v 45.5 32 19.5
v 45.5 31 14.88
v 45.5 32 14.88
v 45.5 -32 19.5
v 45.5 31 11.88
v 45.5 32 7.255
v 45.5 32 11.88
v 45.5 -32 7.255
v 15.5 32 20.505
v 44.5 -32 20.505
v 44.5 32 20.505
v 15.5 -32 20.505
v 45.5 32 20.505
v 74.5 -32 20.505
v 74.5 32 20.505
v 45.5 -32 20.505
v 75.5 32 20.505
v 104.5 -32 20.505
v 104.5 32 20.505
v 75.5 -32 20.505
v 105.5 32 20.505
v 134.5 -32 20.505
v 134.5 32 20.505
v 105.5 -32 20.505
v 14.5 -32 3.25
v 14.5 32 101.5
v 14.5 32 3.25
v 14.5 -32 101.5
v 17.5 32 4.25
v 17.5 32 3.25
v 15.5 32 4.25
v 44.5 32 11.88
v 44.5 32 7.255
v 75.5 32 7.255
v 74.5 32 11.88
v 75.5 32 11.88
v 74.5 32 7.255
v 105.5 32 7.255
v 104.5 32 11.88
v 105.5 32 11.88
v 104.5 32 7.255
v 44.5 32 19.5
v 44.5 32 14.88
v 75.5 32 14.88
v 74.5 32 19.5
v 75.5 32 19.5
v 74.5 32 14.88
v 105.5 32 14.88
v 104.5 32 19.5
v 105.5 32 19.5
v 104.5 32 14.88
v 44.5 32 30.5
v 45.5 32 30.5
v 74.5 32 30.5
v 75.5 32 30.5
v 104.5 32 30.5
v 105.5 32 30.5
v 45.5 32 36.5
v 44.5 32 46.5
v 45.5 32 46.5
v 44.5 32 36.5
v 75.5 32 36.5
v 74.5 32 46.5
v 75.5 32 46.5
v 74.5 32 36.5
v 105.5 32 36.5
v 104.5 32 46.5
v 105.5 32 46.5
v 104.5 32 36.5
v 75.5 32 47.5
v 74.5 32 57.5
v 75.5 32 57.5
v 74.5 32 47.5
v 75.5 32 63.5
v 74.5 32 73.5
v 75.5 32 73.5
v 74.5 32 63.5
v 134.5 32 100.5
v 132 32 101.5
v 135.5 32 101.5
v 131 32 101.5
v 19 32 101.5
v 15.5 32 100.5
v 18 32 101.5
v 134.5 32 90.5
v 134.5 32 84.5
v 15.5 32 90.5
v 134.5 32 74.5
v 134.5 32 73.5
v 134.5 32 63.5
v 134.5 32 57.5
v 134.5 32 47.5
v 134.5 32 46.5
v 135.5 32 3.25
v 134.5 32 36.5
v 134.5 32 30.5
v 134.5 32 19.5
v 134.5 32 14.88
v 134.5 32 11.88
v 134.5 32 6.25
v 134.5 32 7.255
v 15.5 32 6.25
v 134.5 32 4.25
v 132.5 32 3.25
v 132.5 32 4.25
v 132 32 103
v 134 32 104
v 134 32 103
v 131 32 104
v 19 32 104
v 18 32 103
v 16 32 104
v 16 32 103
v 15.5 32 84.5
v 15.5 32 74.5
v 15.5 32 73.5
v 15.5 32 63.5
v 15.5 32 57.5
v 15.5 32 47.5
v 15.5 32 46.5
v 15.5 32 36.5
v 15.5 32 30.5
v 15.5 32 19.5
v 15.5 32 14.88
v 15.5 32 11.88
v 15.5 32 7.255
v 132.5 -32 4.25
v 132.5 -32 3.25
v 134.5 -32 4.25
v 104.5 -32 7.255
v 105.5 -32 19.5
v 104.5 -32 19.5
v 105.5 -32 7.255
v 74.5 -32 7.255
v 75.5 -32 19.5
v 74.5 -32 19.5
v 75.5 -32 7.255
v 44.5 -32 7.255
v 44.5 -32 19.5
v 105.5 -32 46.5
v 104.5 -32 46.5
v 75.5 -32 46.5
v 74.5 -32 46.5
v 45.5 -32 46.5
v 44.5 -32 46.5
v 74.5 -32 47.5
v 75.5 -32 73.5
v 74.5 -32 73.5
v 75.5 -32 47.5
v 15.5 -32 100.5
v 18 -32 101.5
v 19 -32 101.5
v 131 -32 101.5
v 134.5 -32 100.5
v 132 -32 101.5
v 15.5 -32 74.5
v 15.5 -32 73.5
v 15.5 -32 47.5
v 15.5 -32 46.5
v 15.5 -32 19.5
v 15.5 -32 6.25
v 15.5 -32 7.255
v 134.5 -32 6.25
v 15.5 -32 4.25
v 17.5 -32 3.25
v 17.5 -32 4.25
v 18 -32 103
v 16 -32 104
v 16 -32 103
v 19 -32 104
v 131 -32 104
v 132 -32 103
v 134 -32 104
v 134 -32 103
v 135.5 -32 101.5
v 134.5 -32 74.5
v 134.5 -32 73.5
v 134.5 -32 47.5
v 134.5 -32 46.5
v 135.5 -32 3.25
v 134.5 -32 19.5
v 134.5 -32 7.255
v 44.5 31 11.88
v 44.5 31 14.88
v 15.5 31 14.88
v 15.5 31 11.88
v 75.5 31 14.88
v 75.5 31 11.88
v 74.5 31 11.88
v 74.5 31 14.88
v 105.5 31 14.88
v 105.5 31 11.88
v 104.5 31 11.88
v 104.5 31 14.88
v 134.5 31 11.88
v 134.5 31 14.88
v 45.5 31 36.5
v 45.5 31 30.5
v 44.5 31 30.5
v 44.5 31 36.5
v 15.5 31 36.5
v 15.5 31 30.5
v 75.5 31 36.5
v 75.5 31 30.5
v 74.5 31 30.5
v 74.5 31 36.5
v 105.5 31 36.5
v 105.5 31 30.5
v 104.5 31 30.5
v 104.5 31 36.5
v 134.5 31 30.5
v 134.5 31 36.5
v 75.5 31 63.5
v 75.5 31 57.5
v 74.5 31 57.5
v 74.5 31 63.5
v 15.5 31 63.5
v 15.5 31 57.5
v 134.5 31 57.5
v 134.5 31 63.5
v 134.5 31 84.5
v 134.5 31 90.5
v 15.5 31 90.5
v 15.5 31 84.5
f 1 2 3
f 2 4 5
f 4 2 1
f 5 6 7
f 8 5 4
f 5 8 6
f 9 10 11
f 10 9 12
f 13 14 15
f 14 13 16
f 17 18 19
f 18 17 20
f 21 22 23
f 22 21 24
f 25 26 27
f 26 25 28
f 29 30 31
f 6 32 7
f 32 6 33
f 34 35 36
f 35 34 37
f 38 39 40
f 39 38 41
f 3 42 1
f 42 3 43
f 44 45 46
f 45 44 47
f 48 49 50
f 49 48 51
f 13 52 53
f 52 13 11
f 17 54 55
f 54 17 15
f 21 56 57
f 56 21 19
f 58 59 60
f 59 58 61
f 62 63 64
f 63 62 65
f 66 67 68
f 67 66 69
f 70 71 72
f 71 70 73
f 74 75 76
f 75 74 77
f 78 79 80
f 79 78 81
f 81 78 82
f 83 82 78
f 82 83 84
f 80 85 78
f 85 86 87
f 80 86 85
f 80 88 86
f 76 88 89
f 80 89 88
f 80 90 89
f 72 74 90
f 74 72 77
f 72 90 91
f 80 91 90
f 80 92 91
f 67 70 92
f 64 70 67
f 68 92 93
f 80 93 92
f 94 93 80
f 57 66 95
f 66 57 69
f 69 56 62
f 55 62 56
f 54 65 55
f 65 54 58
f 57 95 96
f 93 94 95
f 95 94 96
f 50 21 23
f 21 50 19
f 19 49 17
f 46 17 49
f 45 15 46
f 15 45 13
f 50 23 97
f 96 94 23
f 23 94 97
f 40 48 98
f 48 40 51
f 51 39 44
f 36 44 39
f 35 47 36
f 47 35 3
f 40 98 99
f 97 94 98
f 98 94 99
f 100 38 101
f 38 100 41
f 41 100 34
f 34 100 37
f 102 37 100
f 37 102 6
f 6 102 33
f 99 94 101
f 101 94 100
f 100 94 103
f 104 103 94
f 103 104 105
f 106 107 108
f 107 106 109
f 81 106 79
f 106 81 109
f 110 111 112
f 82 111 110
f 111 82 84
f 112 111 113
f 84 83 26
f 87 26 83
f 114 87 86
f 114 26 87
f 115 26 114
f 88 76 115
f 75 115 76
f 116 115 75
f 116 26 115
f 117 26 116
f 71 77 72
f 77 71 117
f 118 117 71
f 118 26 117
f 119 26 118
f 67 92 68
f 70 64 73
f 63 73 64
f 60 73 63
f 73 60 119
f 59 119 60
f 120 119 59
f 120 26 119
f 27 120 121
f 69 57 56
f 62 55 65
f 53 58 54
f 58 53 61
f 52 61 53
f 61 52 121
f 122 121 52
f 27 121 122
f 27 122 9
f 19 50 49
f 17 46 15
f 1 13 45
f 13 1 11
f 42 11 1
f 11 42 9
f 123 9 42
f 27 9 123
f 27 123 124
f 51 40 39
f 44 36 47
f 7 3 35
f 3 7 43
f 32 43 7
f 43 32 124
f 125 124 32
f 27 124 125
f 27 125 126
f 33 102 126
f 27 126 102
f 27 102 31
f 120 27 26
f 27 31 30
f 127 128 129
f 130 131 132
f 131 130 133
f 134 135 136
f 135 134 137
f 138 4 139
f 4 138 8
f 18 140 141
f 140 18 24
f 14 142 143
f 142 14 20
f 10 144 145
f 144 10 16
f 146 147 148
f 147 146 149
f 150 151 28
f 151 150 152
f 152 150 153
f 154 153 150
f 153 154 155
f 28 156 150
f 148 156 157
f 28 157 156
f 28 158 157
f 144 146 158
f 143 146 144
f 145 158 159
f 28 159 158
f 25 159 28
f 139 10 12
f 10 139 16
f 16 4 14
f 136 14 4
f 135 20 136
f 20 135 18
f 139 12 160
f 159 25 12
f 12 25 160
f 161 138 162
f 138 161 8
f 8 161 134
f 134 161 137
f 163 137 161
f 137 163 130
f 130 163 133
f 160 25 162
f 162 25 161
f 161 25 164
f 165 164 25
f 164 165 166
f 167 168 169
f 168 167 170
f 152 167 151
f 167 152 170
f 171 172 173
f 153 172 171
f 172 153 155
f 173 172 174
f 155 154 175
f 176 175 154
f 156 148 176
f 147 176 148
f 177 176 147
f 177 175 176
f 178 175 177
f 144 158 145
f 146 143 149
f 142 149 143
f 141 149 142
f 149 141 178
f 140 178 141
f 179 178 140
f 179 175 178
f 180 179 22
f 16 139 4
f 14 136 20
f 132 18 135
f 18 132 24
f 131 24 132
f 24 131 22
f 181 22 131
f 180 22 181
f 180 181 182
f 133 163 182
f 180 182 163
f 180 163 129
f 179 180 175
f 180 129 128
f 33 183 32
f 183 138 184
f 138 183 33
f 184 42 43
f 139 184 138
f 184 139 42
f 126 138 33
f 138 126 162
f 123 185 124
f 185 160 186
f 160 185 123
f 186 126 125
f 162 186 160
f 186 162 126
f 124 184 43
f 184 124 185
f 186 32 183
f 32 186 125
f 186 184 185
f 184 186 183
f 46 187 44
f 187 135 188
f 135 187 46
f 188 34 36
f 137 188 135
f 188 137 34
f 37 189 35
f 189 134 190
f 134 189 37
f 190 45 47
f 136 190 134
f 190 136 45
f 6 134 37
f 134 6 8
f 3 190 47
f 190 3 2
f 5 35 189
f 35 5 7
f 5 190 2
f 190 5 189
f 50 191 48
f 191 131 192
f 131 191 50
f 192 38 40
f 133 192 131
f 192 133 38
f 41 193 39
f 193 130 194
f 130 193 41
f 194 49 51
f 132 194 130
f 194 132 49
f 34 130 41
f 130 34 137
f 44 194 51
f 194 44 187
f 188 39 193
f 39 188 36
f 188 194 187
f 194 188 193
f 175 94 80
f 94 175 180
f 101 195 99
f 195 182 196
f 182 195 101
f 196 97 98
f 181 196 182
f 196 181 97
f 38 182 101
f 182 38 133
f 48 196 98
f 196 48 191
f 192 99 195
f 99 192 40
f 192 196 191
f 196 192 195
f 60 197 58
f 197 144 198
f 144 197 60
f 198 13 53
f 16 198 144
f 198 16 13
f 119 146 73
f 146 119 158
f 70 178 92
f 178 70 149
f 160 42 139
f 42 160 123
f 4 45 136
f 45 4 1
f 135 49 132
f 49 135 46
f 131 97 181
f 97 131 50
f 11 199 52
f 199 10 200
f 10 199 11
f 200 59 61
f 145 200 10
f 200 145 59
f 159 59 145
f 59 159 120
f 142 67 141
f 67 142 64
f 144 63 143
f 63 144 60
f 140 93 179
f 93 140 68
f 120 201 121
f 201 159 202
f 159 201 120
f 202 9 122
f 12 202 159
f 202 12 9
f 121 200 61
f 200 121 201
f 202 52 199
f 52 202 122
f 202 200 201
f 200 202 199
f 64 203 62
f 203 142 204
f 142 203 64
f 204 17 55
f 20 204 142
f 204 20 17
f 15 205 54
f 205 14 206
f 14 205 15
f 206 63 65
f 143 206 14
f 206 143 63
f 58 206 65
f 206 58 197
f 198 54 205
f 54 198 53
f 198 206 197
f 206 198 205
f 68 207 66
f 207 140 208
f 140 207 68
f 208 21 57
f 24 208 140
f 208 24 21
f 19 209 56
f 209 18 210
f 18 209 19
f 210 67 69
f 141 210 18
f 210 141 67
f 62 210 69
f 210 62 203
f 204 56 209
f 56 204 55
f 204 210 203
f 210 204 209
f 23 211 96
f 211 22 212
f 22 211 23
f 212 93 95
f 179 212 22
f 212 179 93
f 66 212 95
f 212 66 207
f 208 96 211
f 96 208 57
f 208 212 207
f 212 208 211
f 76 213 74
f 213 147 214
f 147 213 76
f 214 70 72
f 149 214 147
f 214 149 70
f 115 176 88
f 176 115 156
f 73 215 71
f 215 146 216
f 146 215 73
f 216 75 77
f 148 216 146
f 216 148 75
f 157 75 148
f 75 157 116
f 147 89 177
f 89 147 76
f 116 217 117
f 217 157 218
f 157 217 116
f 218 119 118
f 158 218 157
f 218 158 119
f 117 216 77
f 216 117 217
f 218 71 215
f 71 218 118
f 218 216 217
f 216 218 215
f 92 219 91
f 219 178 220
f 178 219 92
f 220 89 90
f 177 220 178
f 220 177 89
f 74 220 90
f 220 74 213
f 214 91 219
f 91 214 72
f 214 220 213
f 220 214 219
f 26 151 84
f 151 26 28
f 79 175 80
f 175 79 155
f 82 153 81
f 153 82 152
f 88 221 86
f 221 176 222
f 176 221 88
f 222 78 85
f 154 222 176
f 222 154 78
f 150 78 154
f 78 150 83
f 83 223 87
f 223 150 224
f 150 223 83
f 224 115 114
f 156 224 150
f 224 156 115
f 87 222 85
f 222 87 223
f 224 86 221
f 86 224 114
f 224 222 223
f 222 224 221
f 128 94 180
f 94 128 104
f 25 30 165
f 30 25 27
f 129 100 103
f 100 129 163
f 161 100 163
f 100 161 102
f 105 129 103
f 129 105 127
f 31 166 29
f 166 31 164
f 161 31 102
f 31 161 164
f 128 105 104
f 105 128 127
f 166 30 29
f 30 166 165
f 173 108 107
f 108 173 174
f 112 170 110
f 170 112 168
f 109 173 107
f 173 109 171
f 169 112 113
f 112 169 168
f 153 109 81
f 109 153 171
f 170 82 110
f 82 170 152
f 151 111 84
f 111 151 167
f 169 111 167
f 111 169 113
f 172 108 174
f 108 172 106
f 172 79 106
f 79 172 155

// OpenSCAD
// Half height row(s)
half_row = 1; // 0:25

// Standard height/width row(s)
normal_row = 1; // 0:25

//Double width row(s)
double_row = 1; // 0:25

//Quad width row(s)
quad_row = 1; // 0:25

//Height (mm)
height = 64;

//Top Mounting Clips
topclip = 1; // 0:1

//Bottom Mounting Clips
btmclip = 1; // 0:1

//Left Mounting Clips
//lftclip = 1; // 0:1

//Right Mounting Clips
//rgtclip = 1; // 0:1



grid();


module grid (){

	if (half_row > 0) {
		for (row = [1:half_row]) {
			for (col = [1 : 4]) {
				translate(v = [col*30, 0, row*13.38]) {
						half_box();
				}
			}
		}
	}

	if (normal_row > 0) {
		for (row = [1:normal_row]) {
			for (col = [1 : 4]) {
				translate(v = [col*30, 0, row*27+(half_row*13.5-7)]) {
						box();
				}
			}
		}
	}

	if (double_row > 0) {
		for (row = [1:double_row]) {
			for (col = [1 : 2]) {
				translate(v = [col*60-15 , 0, row*27+(half_row*13.5-7)+(normal_row*27)]) {
						double_box();
				}
			}
		}
	}

	if (quad_row > 0) {
		for (row = [1:quad_row]) {
			translate(v = [75 , 0, row*27+(half_row*13.5-7)+(normal_row*27)+(double_row*27)]) {
					quad_box();
			}
		}
	}
	if (topclip > 0) {
		translate(v = [14.5,-height/2,3.25]) {
			difference() {
				cube(size = [121,height,4]);
				translate( v = [1,0,1]) {
					cube(size = [119,height,2]);
				}
				translate( v = [3,0,0]) {
					cube(size = [115,height,1]);
				}
			}
		}
	}
	if (btmclip > 0) {
		translate(v = [16,-height/2,half_row*13.5+((normal_row+double_row+quad_row)*27)+7]) {
			difference() {
				cube(size = [118,height,2.5]);
				translate( v = [3,0,0]) {
					cube(size = [112,height,2.5]);
				}
				translate( v = [0,0,0]) {
					cube(size = [2,height,1.5]);
				}
				translate( v = [116,0,0]) {
					cube(size = [2,height,1.5]);
				}
			}
		}
	}
}




module half_box(){
	difference() {
		cube(size = [31,height,14.25], center = true);
		cube(size = [29,height,12.25], center = true);
	}

	translate(v = [0,(height / 2)-0.5,0]) {
		cube(size = [31,1,3], center=true);
	}

}

module box(){
	difference() {
		cube(size = [31,height,28], center = true);
		cube(size = [29,height,26], center = true);
	}

	translate(v = [0,(height / 2)-0.5,0]) {
		cube(size = [31,1,6], center=true);
	}
}

module double_box(){
	difference() {
		cube(size = [61,height,28], center = true);
		cube(size = [59,height,26], center = true);
	}

	translate(v = [0,(height / 2)-0.5,0]) {
		cube(size = [61,1,6], center=true);
	}
}

module quad_box(){
	difference() {
		cube(size = [121,height,28], center = true);
		cube(size = [119,height,26], center = true);
	}

	translate(v = [0,(height / 2)-0.5,0]) {
		cube(size = [121,1,6], center=true);
	}
}
